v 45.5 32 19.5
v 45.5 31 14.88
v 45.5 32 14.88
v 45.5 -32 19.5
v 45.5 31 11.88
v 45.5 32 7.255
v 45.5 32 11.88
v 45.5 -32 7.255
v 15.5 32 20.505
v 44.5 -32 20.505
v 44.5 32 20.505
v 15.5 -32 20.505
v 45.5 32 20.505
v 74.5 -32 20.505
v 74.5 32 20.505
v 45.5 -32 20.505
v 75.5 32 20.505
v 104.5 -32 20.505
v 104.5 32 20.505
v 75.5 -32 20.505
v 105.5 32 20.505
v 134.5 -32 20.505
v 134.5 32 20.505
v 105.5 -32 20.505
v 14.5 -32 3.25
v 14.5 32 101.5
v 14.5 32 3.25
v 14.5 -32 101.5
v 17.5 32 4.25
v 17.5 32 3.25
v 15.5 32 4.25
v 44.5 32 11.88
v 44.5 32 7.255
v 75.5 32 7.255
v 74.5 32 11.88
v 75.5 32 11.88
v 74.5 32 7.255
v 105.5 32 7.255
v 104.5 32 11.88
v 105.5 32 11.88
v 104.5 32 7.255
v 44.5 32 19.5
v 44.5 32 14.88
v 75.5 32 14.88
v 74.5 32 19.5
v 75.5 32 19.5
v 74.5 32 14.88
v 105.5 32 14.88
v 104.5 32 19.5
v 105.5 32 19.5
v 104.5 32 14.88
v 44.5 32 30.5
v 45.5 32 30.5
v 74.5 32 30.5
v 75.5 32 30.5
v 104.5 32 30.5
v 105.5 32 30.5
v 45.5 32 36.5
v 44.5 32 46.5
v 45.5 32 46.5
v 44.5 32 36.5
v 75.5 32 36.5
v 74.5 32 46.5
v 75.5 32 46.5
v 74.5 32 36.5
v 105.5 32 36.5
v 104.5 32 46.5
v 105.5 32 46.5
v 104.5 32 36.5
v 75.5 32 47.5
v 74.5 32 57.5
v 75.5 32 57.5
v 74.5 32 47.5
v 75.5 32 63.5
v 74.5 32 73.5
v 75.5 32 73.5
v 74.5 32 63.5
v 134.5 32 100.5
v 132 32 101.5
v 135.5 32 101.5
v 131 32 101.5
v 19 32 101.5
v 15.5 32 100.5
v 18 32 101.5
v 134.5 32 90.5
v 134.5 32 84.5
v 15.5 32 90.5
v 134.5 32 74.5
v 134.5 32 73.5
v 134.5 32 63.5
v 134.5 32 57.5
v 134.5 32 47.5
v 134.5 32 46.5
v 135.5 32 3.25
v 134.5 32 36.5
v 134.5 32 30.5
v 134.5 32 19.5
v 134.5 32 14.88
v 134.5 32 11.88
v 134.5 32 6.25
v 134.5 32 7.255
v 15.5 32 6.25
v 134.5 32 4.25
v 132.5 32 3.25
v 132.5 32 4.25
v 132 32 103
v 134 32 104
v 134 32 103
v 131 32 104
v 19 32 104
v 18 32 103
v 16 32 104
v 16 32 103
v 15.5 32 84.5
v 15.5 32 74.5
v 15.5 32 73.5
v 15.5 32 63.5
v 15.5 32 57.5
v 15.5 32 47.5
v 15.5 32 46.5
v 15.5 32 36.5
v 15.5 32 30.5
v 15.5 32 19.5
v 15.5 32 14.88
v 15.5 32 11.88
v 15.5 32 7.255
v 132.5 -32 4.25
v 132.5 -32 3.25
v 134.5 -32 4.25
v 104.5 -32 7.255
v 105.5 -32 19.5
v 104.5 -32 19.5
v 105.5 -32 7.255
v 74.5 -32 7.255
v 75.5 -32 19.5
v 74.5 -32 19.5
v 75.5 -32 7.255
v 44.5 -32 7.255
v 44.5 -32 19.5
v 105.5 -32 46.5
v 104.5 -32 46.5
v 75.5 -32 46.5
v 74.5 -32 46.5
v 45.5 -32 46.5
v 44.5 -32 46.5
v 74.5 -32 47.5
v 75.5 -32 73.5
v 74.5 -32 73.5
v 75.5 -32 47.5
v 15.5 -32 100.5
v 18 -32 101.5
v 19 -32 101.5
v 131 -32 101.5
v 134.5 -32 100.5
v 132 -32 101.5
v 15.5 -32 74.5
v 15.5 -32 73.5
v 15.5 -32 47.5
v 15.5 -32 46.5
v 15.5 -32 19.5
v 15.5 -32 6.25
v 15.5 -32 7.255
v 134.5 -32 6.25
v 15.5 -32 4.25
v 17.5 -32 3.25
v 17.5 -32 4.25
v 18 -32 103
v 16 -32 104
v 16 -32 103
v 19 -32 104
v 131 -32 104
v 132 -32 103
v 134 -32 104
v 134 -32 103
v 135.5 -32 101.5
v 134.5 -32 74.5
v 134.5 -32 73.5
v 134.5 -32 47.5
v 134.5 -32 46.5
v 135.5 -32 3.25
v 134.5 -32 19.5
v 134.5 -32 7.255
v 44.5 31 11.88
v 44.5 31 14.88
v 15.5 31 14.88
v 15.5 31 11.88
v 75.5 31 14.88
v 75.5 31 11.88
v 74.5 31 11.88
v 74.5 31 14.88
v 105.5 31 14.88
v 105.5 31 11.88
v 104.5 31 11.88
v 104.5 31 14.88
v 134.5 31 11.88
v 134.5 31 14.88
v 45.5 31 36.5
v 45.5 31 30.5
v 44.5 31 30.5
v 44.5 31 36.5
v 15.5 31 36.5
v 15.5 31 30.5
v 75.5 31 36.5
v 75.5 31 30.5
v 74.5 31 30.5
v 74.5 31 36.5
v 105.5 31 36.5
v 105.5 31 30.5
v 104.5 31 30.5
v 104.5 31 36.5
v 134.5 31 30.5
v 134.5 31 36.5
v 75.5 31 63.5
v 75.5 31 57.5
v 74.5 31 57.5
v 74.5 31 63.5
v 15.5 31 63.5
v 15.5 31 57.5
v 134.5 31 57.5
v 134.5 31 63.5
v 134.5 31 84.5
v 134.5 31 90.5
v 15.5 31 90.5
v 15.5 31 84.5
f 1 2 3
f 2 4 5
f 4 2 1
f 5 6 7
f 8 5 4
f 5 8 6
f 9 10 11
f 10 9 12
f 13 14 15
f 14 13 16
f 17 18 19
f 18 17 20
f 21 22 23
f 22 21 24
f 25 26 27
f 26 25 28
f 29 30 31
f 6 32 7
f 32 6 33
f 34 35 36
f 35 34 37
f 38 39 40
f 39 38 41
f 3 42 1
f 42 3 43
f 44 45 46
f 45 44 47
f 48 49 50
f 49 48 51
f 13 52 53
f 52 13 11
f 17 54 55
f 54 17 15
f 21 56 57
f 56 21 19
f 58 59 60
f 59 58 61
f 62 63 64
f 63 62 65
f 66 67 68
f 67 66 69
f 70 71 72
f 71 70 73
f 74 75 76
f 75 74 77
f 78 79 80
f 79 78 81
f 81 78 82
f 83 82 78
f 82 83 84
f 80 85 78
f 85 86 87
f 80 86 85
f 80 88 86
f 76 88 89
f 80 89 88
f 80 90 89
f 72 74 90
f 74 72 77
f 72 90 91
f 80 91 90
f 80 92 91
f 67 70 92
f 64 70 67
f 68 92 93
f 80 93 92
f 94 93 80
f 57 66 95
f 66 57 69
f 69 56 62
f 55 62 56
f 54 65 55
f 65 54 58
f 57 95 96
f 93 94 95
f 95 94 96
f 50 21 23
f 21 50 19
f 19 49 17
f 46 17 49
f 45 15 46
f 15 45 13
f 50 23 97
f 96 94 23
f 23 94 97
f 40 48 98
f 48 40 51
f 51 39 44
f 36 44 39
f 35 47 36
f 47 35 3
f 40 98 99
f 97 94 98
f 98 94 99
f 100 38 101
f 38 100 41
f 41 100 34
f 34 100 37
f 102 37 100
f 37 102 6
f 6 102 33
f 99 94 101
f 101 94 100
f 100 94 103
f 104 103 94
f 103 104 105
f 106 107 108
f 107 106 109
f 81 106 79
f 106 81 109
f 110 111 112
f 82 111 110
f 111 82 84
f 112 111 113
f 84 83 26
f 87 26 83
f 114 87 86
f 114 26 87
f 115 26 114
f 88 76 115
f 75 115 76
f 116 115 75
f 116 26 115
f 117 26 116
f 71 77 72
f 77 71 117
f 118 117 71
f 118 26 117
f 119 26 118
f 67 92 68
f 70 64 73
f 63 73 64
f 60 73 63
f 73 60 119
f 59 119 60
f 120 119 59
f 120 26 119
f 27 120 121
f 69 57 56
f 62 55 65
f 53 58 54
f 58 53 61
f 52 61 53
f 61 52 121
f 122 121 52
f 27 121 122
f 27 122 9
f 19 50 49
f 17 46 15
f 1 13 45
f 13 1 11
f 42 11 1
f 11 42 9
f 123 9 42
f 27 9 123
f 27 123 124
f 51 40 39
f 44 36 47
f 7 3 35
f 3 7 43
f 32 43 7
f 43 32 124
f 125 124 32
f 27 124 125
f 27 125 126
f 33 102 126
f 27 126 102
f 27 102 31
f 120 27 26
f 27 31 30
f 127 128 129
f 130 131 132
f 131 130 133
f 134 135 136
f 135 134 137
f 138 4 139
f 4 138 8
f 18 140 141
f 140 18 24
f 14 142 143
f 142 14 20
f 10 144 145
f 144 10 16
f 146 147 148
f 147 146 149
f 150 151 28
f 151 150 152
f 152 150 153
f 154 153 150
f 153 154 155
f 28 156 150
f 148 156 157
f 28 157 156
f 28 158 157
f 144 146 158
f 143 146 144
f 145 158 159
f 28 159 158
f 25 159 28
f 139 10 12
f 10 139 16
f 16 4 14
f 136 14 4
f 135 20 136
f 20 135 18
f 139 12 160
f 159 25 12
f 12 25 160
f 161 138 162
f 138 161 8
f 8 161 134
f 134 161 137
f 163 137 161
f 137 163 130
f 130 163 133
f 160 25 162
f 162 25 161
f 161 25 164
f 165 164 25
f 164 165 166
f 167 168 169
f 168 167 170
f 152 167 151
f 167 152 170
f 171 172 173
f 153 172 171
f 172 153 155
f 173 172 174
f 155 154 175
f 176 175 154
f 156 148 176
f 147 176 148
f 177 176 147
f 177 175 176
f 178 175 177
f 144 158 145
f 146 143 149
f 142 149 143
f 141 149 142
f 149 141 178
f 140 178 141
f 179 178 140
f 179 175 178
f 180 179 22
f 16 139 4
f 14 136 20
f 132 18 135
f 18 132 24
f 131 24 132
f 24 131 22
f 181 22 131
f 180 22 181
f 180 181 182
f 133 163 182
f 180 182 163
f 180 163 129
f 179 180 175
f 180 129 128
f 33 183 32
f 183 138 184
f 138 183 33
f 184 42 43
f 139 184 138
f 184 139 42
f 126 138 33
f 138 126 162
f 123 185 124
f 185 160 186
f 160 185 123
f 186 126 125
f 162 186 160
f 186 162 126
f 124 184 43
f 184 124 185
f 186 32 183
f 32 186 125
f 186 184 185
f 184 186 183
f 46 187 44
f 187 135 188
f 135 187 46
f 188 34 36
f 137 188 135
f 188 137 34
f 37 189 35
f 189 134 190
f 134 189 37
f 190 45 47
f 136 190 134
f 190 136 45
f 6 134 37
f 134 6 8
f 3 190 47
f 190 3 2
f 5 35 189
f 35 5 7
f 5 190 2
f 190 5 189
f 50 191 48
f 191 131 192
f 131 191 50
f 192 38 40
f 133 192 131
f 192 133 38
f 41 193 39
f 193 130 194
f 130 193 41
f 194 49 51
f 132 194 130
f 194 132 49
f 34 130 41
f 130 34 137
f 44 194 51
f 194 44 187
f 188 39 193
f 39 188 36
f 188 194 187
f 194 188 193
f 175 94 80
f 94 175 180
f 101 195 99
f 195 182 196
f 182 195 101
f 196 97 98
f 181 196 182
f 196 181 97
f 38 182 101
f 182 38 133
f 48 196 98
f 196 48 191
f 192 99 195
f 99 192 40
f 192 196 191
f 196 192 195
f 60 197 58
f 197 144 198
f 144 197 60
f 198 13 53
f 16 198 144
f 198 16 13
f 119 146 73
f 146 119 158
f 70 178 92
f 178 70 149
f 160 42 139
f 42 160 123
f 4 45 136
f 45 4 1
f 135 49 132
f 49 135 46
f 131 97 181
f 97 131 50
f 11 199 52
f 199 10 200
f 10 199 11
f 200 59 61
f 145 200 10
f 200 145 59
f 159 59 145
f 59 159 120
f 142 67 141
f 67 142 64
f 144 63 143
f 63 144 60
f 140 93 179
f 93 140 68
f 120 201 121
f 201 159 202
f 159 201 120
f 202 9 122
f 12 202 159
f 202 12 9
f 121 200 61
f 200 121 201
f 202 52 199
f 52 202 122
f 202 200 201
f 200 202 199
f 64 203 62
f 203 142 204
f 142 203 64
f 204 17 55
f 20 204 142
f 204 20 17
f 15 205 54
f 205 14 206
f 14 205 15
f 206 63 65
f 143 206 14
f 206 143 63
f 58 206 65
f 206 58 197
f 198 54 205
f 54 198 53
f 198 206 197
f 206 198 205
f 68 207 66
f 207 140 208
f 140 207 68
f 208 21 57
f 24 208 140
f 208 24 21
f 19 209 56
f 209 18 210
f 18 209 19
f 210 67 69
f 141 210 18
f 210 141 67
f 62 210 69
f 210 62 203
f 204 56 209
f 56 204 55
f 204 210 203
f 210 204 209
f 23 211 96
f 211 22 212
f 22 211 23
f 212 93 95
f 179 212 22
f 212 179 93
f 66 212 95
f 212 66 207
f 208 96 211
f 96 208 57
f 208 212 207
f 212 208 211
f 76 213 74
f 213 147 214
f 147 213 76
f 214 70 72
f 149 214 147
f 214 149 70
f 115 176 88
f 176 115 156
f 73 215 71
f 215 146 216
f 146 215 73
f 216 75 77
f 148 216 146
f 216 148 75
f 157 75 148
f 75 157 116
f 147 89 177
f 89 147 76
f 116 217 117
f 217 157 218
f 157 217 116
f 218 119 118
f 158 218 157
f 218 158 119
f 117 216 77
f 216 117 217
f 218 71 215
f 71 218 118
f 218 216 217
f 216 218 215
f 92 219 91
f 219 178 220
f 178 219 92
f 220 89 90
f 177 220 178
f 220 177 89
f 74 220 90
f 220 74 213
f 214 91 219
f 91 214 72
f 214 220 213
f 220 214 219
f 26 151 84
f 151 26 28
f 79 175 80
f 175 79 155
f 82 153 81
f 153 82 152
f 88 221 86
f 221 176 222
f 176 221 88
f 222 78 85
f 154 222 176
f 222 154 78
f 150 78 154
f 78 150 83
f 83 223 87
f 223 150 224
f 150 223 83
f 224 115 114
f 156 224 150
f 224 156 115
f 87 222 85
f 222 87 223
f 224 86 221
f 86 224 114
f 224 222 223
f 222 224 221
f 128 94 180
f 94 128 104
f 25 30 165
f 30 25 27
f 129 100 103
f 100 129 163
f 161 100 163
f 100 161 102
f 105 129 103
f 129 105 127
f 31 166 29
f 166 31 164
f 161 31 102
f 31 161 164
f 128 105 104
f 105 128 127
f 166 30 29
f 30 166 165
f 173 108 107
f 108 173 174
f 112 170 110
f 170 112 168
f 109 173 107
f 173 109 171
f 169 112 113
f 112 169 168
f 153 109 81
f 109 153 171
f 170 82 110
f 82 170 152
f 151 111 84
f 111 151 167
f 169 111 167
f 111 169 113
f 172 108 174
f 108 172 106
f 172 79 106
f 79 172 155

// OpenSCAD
// Half height row(s)
half_row = 1; // 0:25

// Standard height/width row(s)
normal_row = 1; // 0:25

//Double width row(s)
double_row = 1; // 0:25

//Quad width row(s)
quad_row = 1; // 0:25

//Height (mm)
height = 64;

//Top Mounting Clips
topclip = 1; // 0:1

//Bottom Mounting Clips
btmclip = 1; // 0:1

//Left Mounting Clips
//lftclip = 1; // 0:1

//Right Mounting Clips
//rgtclip = 1; // 0:1



grid();


module grid (){

	if (half_row > 0) {
		for (row = [1:half_row]) {
			for (col = [1 : 4]) {
				translate(v = [col*30, 0, row*13.38]) {
						half_box();
				}
			}
		}
	}

	if (normal_row > 0) {
		for (row = [1:normal_row]) {
			for (col = [1 : 4]) {
				translate(v = [col*30, 0, row*27+(half_row*13.5-7)]) {
						box();
				}
			}
		}
	}

	if (double_row > 0) {
		for (row = [1:double_row]) {
			for (col = [1 : 2]) {
				translate(v = [col*60-15 , 0, row*27+(half_row*13.5-7)+(normal_row*27)]) {
						double_box();
				}
			}
		}
	}

	if (quad_row > 0) {
		for (row = [1:quad_row]) {
			translate(v = [75 , 0, row*27+(half_row*13.5-7)+(normal_row*27)+(double_row*27)]) {
					quad_box();
			}
		}
	}
	if (topclip > 0) {
		translate(v = [14.5,-height/2,3.25]) {
			difference() {
				cube(size = [121,height,4]);
				translate( v = [1,0,1]) {
					cube(size = [119,height,2]);
				}
				translate( v = [3,0,0]) {
					cube(size = [115,height,1]);
				}
			}
		}
	}
	if (btmclip > 0) {
		translate(v = [16,-height/2,half_row*13.5+((normal_row+double_row+quad_row)*27)+7]) {
			difference() {
				cube(size = [118,height,2.5]);
				translate( v = [3,0,0]) {
					cube(size = [112,height,2.5]);
				}
				translate( v = [0,0,0]) {
					cube(size = [2,height,1.5]);
				}
				translate( v = [116,0,0]) {
					cube(size = [2,height,1.5]);
				}
			}
		}
	}
}




module half_box(){
	difference() {
		cube(size = [31,height,14.25], center = true);
		cube(size = [29,height,12.25], center = true);
	}

	translate(v = [0,(height / 2)-0.5,0]) {
		cube(size = [31,1,3], center=true);
	}

}

module box(){
	difference() {
		cube(size = [31,height,28], center = true);
		cube(size = [29,height,26], center = true);
	}

	translate(v = [0,(height / 2)-0.5,0]) {
		cube(size = [31,1,6], center=true);
	}
}

module double_box(){
	difference() {
		cube(size = [61,height,28], center = true);
		cube(size = [59,height,26], center = true);
	}

	translate(v = [0,(height / 2)-0.5,0]) {
		cube(size = [61,1,6], center=true);
	}
}

module quad_box(){
	difference() {
		cube(size = [121,height,28], center = true);
		cube(size = [119,height,26], center = true);
	}

	translate(v = [0,(height / 2)-0.5,0]) {
		cube(size = [121,1,6], center=true);
	}
}
